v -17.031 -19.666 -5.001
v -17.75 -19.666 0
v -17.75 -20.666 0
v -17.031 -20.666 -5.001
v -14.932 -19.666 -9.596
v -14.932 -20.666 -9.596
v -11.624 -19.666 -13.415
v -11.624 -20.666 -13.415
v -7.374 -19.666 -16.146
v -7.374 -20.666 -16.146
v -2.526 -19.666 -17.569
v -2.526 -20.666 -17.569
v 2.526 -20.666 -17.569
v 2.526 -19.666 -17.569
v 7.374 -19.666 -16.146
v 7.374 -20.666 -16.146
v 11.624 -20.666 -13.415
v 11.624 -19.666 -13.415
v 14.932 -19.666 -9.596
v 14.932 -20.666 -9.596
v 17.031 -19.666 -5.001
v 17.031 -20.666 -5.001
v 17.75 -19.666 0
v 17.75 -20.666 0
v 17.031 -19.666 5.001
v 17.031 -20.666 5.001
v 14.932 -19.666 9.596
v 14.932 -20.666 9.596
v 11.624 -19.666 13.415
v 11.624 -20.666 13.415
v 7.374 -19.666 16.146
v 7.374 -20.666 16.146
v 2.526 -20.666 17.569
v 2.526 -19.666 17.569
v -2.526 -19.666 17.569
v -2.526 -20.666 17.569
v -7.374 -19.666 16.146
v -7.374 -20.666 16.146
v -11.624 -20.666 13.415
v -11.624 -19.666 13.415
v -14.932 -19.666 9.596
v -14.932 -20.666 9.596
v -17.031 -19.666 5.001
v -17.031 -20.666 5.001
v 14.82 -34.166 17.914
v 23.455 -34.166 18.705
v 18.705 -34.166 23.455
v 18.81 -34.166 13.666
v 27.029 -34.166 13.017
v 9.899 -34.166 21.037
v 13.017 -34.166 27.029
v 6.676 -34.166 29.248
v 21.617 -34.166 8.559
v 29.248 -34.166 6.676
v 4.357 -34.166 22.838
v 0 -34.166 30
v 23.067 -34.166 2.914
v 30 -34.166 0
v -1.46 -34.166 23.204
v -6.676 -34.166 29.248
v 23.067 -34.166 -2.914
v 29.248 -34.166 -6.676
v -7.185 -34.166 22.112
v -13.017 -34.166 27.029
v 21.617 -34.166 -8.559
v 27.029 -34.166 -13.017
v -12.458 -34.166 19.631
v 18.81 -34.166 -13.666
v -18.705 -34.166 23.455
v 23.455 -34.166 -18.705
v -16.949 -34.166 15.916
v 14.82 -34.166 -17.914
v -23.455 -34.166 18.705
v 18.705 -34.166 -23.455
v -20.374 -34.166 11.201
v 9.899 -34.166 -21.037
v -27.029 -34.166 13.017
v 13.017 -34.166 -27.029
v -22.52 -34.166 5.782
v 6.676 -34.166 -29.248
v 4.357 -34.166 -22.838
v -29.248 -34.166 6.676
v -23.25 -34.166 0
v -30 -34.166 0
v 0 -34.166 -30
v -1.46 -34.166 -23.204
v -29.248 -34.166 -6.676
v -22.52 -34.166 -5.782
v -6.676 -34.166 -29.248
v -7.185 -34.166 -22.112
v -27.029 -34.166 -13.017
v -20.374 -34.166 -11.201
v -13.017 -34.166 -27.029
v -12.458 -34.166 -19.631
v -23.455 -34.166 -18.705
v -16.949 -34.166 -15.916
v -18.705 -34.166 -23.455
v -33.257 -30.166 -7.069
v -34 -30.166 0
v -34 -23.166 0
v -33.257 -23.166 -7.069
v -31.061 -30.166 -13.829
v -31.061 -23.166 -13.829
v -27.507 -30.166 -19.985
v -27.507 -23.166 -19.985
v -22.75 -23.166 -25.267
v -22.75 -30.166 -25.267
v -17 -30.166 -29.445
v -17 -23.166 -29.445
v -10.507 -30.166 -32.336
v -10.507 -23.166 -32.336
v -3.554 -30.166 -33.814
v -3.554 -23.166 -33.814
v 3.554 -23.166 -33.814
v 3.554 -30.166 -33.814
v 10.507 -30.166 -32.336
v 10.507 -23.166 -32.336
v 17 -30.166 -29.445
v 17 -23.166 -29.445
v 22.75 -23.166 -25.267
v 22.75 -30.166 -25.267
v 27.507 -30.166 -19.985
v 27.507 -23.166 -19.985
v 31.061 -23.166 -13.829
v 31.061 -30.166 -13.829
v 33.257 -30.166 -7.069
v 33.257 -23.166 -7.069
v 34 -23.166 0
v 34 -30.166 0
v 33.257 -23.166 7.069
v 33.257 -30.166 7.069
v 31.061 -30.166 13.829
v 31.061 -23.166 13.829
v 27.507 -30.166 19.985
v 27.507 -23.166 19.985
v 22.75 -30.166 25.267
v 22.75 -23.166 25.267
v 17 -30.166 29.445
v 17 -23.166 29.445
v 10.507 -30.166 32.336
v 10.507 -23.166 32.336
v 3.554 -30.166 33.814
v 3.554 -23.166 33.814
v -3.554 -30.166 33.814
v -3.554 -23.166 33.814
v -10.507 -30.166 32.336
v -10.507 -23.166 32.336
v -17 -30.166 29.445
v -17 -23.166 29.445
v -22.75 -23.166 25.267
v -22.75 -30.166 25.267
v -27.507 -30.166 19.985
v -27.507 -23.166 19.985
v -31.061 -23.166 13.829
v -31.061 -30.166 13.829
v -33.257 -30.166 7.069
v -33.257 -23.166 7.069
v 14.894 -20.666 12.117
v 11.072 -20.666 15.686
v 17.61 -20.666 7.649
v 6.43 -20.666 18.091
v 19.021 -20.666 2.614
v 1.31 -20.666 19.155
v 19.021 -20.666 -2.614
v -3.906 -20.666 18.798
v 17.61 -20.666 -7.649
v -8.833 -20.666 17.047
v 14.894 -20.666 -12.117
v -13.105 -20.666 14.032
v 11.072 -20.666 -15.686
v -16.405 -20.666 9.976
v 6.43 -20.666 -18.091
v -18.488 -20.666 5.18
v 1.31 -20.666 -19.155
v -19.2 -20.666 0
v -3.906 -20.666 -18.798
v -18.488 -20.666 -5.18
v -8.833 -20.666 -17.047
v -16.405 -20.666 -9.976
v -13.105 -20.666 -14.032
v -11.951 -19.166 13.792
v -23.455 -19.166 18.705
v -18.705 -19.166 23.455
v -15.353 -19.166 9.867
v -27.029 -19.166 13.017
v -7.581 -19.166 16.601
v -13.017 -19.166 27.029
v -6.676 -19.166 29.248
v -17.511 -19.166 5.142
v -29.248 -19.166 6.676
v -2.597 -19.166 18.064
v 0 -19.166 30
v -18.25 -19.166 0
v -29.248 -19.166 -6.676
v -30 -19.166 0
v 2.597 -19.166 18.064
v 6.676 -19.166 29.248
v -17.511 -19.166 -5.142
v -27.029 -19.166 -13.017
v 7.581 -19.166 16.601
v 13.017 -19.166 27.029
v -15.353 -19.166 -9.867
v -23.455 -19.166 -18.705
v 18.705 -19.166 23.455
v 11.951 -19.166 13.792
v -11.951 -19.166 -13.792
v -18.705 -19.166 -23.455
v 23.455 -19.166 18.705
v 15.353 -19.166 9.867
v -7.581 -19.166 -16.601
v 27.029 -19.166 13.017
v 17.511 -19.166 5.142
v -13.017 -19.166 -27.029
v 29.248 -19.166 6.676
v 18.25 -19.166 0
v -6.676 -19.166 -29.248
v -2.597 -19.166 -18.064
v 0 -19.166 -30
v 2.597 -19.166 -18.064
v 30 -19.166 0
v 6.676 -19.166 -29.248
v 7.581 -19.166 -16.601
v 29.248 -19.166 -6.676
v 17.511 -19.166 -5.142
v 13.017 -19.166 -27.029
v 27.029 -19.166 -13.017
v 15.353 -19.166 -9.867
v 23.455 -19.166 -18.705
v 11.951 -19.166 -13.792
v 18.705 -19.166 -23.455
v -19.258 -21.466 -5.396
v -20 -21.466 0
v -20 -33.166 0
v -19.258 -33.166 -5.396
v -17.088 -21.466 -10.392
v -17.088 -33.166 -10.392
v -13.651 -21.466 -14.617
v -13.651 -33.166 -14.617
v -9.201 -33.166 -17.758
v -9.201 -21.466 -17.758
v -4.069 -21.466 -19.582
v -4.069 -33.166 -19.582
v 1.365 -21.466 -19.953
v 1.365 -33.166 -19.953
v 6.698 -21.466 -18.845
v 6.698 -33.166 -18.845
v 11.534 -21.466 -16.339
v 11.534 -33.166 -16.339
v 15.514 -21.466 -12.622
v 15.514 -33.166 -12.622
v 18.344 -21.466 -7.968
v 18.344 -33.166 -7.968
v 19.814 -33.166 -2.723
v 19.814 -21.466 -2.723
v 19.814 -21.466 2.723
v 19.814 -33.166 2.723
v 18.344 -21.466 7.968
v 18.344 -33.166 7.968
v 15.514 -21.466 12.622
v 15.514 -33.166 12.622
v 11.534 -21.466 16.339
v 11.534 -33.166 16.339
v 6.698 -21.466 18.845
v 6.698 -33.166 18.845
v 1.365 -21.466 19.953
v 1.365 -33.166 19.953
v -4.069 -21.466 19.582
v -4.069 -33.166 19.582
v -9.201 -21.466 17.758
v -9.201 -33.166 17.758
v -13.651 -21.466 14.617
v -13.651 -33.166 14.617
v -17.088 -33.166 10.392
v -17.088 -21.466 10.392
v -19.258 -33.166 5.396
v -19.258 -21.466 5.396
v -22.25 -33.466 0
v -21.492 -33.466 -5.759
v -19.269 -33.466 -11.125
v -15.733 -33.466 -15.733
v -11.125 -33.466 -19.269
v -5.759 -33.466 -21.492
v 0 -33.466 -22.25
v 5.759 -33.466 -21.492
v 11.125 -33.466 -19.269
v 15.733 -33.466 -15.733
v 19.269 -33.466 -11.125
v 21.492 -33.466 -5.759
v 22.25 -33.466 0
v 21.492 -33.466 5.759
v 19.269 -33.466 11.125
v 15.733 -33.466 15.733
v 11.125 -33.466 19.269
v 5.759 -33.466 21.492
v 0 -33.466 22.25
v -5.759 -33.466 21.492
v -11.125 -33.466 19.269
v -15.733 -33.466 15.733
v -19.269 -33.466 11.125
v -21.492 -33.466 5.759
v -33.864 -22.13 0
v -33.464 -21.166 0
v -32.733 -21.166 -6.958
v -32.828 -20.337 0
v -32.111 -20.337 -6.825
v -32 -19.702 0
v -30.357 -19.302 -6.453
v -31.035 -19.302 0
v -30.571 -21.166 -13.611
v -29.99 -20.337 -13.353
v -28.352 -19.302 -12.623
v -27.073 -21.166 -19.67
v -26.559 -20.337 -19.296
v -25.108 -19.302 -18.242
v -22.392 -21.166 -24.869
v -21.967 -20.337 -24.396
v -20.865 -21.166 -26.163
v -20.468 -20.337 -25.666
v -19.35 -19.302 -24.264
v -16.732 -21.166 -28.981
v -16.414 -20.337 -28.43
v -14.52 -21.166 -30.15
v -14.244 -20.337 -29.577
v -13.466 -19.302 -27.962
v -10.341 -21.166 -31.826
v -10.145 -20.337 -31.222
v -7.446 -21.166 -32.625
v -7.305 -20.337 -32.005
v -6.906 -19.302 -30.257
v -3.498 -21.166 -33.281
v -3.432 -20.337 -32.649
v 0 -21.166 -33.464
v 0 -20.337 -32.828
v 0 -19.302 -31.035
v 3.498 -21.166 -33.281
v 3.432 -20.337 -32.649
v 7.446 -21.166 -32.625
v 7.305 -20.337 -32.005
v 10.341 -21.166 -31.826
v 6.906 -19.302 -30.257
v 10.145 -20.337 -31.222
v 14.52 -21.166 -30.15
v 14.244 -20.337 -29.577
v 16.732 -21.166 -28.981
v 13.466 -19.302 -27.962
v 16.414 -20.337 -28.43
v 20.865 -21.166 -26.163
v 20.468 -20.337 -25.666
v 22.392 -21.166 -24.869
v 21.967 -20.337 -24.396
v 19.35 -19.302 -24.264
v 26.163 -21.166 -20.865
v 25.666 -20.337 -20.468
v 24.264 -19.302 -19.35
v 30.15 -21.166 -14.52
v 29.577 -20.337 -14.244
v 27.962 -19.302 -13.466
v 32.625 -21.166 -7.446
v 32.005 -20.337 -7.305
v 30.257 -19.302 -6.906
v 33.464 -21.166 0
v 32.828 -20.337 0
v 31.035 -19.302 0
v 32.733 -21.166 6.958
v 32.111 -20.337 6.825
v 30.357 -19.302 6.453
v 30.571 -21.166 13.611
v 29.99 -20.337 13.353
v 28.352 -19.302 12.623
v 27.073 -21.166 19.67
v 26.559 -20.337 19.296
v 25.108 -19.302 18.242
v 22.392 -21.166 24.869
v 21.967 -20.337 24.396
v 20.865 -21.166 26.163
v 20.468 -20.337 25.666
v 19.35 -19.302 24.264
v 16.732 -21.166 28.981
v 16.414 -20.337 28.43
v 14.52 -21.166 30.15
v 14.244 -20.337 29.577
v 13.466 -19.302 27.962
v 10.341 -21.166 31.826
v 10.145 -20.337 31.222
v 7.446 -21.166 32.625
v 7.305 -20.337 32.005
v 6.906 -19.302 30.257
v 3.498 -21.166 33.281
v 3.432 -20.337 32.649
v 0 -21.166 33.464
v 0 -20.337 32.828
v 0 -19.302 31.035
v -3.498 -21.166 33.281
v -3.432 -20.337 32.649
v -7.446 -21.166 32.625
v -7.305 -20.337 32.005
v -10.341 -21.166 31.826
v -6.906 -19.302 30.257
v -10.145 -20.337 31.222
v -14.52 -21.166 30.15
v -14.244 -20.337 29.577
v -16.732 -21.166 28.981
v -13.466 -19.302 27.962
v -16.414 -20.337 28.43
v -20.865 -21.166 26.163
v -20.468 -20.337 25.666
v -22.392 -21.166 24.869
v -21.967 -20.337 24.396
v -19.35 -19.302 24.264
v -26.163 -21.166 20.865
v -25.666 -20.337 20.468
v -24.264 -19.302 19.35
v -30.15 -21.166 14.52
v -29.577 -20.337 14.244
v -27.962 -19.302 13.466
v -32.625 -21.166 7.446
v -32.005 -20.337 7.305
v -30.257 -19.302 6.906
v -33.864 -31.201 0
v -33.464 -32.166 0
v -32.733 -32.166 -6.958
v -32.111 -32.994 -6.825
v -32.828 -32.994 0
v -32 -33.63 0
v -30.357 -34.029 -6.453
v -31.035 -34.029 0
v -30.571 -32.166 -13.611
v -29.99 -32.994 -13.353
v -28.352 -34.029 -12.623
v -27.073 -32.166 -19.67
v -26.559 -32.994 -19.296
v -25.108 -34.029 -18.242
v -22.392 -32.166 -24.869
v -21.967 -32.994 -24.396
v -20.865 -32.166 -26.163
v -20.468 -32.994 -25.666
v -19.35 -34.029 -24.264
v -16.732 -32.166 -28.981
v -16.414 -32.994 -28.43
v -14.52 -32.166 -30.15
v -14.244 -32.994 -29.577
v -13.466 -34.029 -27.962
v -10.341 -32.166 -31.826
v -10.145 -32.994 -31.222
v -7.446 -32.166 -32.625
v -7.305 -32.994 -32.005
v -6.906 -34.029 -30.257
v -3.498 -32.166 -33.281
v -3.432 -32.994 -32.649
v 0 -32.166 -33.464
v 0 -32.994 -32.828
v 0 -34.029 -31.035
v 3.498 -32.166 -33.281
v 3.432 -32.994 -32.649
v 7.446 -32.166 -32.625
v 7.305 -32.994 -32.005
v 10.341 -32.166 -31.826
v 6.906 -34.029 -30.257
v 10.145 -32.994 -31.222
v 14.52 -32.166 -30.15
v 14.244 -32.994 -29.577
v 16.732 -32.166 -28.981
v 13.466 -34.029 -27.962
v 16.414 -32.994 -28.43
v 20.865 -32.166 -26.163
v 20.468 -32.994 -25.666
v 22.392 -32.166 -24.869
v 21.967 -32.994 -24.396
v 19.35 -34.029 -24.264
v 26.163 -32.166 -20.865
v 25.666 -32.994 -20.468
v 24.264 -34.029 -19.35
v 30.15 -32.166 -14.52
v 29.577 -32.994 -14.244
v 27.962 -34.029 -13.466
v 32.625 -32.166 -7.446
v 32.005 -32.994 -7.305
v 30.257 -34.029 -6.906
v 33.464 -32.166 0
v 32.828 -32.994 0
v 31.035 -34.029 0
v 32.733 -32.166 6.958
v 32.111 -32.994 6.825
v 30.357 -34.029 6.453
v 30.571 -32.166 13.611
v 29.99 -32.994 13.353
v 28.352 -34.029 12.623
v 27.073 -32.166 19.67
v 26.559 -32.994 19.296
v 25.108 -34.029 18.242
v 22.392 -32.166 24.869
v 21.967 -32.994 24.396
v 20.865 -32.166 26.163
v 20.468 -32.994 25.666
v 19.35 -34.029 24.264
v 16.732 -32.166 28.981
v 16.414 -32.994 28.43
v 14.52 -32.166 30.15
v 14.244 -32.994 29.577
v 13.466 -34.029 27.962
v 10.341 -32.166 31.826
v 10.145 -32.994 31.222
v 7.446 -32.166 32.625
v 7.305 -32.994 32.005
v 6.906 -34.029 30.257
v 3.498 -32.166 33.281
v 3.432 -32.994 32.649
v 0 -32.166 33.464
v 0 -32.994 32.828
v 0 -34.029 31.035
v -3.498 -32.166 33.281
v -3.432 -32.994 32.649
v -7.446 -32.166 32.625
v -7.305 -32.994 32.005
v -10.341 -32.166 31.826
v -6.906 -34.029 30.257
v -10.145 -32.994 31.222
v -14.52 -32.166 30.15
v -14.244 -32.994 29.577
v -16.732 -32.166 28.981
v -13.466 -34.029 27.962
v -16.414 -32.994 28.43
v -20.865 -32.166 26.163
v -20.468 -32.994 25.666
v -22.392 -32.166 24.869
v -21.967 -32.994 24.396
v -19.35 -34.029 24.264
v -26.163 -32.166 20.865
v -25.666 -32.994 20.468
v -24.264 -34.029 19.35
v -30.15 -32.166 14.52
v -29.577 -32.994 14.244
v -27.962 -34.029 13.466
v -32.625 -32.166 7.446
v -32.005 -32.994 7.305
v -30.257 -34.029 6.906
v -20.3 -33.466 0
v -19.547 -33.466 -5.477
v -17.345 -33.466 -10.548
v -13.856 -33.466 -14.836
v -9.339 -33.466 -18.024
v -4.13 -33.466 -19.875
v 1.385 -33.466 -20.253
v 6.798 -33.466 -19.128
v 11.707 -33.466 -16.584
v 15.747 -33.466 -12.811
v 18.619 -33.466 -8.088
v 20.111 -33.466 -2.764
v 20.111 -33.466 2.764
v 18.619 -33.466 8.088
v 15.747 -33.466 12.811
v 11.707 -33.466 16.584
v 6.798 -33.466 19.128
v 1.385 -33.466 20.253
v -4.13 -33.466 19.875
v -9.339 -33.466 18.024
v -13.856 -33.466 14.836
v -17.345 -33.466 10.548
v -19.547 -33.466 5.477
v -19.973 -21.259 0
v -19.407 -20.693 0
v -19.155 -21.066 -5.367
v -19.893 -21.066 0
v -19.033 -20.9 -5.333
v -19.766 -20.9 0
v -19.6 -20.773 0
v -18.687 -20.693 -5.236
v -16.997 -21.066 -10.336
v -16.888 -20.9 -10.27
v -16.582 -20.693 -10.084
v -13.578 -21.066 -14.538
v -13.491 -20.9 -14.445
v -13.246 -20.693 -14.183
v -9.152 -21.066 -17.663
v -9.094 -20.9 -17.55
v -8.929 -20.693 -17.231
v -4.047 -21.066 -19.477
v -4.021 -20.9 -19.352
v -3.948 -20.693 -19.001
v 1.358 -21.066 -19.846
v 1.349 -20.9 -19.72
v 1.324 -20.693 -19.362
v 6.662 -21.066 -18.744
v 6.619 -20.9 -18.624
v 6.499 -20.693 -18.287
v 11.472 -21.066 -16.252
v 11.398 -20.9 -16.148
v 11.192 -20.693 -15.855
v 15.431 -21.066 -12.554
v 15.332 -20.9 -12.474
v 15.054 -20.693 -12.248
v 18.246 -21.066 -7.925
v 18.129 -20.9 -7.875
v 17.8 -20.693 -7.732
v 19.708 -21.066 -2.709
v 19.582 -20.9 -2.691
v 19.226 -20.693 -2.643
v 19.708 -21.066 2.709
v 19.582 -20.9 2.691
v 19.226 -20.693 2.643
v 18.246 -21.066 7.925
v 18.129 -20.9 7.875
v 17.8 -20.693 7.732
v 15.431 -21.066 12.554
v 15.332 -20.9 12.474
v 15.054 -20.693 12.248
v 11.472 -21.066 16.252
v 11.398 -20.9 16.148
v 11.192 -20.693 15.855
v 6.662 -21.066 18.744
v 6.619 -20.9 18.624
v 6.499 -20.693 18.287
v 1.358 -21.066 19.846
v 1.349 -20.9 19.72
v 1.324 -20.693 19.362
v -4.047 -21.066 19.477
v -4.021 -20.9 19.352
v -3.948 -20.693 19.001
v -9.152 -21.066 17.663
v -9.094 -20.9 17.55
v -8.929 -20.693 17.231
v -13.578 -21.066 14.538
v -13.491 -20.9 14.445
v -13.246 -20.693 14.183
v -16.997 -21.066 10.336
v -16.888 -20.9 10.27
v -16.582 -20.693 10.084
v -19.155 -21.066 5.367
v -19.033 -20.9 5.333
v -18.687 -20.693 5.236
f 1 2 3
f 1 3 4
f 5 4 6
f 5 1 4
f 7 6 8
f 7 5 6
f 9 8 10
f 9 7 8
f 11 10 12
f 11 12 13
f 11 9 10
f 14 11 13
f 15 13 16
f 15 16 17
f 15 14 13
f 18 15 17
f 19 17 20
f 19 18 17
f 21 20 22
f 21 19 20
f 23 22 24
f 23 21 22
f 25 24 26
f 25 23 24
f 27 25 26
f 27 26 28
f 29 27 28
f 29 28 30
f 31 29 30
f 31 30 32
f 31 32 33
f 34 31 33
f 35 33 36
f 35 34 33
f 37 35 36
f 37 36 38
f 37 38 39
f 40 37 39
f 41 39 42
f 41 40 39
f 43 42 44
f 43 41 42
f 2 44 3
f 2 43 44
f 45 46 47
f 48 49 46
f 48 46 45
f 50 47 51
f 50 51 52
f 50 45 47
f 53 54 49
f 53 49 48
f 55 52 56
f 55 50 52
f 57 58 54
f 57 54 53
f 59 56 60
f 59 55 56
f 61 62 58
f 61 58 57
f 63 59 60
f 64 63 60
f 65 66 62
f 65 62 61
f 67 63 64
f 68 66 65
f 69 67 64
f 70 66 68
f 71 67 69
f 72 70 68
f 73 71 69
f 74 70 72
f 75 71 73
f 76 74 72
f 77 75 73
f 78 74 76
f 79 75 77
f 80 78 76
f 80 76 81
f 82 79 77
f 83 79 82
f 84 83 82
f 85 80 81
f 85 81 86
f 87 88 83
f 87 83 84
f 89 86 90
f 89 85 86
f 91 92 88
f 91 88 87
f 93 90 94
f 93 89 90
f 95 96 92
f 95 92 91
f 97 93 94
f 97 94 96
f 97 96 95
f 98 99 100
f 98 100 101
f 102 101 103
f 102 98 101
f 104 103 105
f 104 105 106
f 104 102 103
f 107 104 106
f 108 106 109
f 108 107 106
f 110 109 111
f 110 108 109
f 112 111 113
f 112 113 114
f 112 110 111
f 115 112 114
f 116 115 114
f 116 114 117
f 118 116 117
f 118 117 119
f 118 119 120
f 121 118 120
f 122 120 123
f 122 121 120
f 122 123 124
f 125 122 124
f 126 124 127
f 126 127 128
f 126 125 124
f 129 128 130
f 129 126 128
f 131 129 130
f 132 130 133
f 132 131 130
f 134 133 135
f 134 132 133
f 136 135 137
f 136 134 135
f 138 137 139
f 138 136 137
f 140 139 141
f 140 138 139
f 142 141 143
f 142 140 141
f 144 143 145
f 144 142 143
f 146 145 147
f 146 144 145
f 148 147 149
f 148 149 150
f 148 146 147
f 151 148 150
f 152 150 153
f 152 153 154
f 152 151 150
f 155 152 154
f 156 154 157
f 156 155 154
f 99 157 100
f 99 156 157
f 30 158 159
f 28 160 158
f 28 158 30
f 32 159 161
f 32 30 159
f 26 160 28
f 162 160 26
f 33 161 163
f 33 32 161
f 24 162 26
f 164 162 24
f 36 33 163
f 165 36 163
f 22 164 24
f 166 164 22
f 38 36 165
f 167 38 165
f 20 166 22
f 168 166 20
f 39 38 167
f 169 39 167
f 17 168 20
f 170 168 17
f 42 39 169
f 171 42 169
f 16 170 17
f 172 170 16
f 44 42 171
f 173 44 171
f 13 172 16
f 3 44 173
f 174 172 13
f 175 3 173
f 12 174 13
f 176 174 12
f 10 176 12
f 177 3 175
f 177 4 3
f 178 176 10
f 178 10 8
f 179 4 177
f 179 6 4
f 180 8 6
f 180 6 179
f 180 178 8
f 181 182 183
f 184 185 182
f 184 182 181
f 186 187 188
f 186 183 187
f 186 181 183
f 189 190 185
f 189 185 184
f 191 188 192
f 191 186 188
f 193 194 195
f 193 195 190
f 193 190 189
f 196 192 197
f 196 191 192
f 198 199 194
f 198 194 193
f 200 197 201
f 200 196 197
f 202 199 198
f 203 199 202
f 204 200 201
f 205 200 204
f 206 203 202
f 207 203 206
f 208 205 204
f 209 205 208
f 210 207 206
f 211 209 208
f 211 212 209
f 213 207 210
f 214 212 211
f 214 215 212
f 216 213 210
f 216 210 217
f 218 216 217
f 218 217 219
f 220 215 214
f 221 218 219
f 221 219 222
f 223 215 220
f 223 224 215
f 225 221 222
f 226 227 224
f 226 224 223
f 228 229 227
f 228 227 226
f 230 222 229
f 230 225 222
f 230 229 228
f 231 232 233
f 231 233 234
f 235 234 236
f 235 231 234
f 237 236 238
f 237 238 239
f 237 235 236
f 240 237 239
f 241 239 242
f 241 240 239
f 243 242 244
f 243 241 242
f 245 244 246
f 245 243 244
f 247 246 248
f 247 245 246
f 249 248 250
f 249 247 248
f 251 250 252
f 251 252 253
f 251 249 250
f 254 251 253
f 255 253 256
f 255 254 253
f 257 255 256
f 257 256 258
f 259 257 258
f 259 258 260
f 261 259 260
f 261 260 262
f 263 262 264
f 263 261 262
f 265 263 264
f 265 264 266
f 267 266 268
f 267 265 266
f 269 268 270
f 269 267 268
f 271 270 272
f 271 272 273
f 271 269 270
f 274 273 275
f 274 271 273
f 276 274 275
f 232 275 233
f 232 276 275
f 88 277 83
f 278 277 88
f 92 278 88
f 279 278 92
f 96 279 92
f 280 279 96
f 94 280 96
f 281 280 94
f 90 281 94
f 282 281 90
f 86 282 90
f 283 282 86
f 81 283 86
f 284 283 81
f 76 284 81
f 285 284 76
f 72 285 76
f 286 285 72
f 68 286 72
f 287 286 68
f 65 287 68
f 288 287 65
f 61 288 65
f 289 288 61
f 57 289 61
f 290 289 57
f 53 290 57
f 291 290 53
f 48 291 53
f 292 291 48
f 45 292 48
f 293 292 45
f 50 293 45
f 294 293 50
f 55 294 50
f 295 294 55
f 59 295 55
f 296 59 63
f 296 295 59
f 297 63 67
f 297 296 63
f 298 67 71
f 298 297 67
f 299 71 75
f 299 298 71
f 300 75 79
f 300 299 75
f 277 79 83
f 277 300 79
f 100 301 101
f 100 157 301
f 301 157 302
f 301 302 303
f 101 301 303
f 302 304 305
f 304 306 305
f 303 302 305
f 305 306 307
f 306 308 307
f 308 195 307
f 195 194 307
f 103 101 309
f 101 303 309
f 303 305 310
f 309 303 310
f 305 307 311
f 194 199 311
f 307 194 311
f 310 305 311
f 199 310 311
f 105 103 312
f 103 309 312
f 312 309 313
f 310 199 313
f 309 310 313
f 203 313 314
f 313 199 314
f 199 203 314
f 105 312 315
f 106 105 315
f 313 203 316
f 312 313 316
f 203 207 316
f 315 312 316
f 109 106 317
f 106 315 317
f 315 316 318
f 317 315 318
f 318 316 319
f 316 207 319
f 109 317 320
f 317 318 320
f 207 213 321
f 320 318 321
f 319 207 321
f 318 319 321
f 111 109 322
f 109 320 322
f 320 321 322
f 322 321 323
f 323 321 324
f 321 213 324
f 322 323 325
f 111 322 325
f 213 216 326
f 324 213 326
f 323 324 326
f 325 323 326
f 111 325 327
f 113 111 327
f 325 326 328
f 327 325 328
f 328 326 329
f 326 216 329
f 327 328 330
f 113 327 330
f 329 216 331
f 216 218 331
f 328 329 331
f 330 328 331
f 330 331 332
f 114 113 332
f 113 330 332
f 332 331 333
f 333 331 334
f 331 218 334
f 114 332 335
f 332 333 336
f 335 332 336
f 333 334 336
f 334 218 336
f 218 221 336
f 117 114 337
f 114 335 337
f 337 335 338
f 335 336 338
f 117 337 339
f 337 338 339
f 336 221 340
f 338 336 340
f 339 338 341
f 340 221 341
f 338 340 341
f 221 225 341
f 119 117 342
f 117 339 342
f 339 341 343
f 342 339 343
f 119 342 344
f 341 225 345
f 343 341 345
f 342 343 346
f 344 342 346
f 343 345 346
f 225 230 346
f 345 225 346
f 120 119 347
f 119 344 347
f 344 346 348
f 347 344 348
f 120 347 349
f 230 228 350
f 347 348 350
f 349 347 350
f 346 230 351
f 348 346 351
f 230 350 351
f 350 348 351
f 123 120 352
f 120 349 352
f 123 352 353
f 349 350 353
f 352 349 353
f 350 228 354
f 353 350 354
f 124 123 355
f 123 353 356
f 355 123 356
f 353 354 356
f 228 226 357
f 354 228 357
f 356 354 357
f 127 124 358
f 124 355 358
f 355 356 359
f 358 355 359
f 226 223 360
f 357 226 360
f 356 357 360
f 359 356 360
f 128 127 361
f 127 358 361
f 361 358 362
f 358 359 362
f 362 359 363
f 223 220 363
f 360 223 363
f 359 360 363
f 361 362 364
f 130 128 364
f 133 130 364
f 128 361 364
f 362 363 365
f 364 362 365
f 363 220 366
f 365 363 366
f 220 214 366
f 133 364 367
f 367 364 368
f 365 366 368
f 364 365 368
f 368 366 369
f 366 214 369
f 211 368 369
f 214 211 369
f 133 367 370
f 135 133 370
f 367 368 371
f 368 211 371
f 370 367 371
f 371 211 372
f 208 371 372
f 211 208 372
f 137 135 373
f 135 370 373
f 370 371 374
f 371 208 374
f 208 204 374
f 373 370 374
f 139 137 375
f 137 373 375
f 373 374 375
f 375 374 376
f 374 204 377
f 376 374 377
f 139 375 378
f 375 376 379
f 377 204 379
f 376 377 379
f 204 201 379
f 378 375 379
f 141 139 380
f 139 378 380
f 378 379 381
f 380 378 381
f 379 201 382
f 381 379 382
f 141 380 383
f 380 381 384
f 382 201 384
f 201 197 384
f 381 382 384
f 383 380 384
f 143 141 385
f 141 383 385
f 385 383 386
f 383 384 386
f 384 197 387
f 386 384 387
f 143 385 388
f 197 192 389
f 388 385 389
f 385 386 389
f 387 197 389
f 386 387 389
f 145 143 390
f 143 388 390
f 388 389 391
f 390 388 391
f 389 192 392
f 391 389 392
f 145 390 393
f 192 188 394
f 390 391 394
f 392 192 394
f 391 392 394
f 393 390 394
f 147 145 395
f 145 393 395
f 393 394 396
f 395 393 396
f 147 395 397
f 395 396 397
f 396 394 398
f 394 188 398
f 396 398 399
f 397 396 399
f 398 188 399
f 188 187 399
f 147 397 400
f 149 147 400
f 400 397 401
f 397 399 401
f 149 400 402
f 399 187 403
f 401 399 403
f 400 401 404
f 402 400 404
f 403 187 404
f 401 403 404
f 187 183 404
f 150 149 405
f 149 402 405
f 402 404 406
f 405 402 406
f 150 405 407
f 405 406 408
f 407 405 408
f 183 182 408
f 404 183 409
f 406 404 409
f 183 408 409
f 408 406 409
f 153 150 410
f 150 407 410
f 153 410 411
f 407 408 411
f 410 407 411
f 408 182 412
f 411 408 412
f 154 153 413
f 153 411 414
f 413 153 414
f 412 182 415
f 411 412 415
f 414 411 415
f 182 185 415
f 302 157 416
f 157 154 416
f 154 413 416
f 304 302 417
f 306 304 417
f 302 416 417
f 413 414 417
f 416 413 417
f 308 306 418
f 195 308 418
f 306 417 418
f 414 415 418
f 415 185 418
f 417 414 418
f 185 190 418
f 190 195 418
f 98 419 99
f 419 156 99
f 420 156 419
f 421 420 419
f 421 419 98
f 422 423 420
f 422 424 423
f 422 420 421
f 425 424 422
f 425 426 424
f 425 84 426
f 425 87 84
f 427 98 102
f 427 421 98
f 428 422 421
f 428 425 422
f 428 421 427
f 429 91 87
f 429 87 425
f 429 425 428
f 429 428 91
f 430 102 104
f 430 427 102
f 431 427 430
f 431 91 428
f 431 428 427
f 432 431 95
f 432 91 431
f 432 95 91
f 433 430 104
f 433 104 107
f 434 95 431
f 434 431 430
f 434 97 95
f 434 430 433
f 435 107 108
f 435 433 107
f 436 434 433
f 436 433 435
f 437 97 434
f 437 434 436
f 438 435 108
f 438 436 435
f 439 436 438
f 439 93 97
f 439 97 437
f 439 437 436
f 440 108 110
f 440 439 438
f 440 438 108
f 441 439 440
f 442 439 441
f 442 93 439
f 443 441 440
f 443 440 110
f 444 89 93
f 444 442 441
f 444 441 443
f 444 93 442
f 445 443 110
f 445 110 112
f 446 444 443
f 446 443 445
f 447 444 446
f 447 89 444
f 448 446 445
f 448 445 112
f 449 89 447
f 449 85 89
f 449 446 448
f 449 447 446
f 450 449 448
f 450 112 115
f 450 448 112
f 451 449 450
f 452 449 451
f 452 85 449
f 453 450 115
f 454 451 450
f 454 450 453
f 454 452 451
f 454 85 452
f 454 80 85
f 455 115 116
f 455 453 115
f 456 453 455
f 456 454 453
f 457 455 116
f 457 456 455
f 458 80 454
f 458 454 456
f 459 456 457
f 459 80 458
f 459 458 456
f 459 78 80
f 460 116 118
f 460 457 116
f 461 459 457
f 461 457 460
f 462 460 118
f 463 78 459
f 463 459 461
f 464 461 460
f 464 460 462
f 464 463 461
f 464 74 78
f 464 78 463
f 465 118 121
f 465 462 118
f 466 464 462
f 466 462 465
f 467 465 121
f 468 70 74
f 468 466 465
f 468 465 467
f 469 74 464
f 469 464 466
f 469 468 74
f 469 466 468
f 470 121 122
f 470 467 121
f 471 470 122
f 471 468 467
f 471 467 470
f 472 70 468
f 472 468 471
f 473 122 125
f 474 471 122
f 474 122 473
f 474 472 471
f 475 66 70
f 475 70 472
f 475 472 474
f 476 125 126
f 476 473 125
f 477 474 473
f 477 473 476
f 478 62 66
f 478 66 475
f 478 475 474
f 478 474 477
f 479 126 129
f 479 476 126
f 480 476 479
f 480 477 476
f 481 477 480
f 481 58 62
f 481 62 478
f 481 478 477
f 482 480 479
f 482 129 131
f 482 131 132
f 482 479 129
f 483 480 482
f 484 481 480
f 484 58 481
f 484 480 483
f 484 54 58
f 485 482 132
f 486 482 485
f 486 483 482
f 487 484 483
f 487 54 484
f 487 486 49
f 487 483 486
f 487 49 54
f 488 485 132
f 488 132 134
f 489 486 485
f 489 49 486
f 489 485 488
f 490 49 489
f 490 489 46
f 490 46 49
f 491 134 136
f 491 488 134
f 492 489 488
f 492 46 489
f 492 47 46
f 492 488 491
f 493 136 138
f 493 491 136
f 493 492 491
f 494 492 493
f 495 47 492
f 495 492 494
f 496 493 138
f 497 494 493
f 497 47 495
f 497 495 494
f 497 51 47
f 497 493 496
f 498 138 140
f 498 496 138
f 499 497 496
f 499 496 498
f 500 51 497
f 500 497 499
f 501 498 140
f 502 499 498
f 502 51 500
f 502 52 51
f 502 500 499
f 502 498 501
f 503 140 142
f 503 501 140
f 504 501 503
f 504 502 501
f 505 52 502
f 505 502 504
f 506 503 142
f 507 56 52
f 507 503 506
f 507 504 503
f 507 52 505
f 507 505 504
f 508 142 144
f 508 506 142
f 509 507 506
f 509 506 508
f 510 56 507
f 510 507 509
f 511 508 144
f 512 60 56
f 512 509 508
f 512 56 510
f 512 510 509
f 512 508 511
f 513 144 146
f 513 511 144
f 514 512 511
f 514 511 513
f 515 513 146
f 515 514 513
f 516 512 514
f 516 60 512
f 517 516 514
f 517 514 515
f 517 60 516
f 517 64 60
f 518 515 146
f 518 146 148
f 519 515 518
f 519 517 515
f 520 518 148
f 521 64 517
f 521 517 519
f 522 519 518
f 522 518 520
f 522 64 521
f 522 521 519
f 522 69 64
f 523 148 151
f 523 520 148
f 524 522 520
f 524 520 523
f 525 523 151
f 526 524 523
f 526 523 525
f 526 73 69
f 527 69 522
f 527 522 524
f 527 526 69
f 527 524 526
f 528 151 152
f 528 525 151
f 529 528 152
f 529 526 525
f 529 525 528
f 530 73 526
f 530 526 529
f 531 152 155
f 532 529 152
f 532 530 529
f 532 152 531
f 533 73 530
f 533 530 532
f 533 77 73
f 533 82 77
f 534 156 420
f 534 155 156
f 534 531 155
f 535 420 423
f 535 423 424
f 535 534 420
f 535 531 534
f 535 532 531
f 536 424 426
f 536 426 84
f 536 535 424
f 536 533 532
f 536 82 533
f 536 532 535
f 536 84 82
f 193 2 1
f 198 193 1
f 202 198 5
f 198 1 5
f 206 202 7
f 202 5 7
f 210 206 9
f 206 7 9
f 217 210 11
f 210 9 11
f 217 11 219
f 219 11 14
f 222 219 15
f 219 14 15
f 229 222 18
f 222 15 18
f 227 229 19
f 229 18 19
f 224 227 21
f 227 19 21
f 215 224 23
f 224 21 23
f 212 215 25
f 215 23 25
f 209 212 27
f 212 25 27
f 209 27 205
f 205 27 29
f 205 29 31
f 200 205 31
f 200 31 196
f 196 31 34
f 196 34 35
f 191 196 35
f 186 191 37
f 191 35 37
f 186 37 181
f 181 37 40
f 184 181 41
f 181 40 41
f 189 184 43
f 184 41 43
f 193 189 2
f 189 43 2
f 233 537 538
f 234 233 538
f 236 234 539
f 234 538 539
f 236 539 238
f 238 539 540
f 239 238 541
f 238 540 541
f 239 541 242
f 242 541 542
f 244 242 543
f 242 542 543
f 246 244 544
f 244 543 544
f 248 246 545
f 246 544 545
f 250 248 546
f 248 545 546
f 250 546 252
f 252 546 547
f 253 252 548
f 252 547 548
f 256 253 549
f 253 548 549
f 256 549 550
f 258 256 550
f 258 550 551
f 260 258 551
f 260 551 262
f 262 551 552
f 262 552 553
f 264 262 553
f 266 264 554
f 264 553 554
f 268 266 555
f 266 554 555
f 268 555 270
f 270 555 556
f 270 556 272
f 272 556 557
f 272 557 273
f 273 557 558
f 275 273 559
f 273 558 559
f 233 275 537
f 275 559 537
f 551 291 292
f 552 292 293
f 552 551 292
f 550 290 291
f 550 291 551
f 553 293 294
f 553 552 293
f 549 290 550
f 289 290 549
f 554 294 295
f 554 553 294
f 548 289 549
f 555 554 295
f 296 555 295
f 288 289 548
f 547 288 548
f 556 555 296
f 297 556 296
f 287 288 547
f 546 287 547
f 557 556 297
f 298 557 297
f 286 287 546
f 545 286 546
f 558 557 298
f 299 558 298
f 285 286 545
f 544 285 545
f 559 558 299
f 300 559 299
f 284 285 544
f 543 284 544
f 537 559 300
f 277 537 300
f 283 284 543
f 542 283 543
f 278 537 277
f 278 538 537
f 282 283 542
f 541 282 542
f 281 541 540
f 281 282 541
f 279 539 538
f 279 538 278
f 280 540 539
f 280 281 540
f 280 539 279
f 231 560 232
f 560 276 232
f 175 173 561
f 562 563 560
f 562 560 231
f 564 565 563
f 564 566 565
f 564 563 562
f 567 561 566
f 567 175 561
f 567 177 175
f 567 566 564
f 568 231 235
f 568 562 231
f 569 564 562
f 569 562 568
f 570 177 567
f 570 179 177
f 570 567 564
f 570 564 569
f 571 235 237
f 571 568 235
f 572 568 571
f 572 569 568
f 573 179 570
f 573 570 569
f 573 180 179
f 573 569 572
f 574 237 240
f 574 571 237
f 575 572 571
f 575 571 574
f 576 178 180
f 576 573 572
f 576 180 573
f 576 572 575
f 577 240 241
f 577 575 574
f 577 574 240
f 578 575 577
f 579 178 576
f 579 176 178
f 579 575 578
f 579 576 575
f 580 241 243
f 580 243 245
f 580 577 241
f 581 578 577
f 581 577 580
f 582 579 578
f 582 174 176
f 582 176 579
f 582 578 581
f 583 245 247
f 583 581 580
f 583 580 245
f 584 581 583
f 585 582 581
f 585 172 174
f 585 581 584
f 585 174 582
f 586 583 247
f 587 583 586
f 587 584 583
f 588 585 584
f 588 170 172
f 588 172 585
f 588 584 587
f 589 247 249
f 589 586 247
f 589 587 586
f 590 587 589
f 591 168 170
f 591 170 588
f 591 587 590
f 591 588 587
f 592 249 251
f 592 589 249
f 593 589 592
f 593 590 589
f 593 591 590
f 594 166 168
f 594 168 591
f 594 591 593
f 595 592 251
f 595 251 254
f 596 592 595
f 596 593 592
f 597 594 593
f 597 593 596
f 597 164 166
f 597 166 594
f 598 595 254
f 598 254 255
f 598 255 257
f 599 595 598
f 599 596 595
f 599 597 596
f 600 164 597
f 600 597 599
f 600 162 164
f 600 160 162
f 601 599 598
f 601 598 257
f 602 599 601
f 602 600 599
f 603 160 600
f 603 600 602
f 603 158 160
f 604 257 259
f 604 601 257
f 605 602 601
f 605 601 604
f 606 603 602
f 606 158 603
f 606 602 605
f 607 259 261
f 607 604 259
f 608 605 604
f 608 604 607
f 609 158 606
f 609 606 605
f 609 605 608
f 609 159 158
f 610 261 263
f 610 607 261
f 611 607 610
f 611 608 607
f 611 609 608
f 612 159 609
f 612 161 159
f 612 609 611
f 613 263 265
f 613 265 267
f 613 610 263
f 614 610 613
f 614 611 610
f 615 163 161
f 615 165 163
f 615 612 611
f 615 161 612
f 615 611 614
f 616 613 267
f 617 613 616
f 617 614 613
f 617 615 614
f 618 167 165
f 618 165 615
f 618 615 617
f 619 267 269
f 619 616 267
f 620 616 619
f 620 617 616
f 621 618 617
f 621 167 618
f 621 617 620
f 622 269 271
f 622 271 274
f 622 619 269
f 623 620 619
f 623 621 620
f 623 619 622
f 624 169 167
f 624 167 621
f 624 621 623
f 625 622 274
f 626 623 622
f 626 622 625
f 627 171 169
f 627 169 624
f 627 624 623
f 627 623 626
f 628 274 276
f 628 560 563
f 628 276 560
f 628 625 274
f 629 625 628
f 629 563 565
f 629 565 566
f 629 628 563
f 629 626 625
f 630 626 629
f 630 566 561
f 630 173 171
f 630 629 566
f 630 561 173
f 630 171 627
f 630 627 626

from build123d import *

# Parameters (mm, degrees)
RACCORDO1_R  = 4
SMUSSO1_SIZE = 0.5
SMUSSO2_SIZE = 0.3
RACCORDO5_R  = 0.8


with BuildPart() as part:
    # Schizzo1 → Rivoluzione1 (revolve)
    with BuildSketch(Plane.XY):
        Polygon((-34, -19.165655205), (-34, -34.165655205), (-23.25, -34.165655205), (-22.25, -33.465655205), (-20, -33.465655205), (-20, -20.665655205), (-17.75, -20.665655205), (-17.75, -19.165655205), align=None)
    revolve(axis=Axis((0, 44.110898502, 0), (0, -1, 0)))

    # Raccordo1
    raccordo1_edges = [part.edges().sort_by_distance(p)[0] for p in [
        (34, -34.165655205, 0),
        (34, -19.165655205, 0),
    ]]
    fillet(raccordo1_edges, radius=RACCORDO1_R)

    # Smusso1
    smusso1_edges = [part.edges().sort_by_distance(p)[0] for p in [
        (17.75, -19.165655205, 0),
    ]]
    chamfer(smusso1_edges, length=SMUSSO1_SIZE)

    # Smusso2
    smusso2_edges = [part.edges().sort_by_distance(p)[0] for p in [
        (20, -33.465655205, 0),
    ]]
    chamfer(smusso2_edges, length=SMUSSO2_SIZE)

    # Raccordo5
    raccordo5_edges = [part.edges().sort_by_distance(p)[0] for p in [
        (20, -20.665655205, 0),
    ]]
    fillet(raccordo5_edges, radius=RACCORDO5_R)


solid = part.part
